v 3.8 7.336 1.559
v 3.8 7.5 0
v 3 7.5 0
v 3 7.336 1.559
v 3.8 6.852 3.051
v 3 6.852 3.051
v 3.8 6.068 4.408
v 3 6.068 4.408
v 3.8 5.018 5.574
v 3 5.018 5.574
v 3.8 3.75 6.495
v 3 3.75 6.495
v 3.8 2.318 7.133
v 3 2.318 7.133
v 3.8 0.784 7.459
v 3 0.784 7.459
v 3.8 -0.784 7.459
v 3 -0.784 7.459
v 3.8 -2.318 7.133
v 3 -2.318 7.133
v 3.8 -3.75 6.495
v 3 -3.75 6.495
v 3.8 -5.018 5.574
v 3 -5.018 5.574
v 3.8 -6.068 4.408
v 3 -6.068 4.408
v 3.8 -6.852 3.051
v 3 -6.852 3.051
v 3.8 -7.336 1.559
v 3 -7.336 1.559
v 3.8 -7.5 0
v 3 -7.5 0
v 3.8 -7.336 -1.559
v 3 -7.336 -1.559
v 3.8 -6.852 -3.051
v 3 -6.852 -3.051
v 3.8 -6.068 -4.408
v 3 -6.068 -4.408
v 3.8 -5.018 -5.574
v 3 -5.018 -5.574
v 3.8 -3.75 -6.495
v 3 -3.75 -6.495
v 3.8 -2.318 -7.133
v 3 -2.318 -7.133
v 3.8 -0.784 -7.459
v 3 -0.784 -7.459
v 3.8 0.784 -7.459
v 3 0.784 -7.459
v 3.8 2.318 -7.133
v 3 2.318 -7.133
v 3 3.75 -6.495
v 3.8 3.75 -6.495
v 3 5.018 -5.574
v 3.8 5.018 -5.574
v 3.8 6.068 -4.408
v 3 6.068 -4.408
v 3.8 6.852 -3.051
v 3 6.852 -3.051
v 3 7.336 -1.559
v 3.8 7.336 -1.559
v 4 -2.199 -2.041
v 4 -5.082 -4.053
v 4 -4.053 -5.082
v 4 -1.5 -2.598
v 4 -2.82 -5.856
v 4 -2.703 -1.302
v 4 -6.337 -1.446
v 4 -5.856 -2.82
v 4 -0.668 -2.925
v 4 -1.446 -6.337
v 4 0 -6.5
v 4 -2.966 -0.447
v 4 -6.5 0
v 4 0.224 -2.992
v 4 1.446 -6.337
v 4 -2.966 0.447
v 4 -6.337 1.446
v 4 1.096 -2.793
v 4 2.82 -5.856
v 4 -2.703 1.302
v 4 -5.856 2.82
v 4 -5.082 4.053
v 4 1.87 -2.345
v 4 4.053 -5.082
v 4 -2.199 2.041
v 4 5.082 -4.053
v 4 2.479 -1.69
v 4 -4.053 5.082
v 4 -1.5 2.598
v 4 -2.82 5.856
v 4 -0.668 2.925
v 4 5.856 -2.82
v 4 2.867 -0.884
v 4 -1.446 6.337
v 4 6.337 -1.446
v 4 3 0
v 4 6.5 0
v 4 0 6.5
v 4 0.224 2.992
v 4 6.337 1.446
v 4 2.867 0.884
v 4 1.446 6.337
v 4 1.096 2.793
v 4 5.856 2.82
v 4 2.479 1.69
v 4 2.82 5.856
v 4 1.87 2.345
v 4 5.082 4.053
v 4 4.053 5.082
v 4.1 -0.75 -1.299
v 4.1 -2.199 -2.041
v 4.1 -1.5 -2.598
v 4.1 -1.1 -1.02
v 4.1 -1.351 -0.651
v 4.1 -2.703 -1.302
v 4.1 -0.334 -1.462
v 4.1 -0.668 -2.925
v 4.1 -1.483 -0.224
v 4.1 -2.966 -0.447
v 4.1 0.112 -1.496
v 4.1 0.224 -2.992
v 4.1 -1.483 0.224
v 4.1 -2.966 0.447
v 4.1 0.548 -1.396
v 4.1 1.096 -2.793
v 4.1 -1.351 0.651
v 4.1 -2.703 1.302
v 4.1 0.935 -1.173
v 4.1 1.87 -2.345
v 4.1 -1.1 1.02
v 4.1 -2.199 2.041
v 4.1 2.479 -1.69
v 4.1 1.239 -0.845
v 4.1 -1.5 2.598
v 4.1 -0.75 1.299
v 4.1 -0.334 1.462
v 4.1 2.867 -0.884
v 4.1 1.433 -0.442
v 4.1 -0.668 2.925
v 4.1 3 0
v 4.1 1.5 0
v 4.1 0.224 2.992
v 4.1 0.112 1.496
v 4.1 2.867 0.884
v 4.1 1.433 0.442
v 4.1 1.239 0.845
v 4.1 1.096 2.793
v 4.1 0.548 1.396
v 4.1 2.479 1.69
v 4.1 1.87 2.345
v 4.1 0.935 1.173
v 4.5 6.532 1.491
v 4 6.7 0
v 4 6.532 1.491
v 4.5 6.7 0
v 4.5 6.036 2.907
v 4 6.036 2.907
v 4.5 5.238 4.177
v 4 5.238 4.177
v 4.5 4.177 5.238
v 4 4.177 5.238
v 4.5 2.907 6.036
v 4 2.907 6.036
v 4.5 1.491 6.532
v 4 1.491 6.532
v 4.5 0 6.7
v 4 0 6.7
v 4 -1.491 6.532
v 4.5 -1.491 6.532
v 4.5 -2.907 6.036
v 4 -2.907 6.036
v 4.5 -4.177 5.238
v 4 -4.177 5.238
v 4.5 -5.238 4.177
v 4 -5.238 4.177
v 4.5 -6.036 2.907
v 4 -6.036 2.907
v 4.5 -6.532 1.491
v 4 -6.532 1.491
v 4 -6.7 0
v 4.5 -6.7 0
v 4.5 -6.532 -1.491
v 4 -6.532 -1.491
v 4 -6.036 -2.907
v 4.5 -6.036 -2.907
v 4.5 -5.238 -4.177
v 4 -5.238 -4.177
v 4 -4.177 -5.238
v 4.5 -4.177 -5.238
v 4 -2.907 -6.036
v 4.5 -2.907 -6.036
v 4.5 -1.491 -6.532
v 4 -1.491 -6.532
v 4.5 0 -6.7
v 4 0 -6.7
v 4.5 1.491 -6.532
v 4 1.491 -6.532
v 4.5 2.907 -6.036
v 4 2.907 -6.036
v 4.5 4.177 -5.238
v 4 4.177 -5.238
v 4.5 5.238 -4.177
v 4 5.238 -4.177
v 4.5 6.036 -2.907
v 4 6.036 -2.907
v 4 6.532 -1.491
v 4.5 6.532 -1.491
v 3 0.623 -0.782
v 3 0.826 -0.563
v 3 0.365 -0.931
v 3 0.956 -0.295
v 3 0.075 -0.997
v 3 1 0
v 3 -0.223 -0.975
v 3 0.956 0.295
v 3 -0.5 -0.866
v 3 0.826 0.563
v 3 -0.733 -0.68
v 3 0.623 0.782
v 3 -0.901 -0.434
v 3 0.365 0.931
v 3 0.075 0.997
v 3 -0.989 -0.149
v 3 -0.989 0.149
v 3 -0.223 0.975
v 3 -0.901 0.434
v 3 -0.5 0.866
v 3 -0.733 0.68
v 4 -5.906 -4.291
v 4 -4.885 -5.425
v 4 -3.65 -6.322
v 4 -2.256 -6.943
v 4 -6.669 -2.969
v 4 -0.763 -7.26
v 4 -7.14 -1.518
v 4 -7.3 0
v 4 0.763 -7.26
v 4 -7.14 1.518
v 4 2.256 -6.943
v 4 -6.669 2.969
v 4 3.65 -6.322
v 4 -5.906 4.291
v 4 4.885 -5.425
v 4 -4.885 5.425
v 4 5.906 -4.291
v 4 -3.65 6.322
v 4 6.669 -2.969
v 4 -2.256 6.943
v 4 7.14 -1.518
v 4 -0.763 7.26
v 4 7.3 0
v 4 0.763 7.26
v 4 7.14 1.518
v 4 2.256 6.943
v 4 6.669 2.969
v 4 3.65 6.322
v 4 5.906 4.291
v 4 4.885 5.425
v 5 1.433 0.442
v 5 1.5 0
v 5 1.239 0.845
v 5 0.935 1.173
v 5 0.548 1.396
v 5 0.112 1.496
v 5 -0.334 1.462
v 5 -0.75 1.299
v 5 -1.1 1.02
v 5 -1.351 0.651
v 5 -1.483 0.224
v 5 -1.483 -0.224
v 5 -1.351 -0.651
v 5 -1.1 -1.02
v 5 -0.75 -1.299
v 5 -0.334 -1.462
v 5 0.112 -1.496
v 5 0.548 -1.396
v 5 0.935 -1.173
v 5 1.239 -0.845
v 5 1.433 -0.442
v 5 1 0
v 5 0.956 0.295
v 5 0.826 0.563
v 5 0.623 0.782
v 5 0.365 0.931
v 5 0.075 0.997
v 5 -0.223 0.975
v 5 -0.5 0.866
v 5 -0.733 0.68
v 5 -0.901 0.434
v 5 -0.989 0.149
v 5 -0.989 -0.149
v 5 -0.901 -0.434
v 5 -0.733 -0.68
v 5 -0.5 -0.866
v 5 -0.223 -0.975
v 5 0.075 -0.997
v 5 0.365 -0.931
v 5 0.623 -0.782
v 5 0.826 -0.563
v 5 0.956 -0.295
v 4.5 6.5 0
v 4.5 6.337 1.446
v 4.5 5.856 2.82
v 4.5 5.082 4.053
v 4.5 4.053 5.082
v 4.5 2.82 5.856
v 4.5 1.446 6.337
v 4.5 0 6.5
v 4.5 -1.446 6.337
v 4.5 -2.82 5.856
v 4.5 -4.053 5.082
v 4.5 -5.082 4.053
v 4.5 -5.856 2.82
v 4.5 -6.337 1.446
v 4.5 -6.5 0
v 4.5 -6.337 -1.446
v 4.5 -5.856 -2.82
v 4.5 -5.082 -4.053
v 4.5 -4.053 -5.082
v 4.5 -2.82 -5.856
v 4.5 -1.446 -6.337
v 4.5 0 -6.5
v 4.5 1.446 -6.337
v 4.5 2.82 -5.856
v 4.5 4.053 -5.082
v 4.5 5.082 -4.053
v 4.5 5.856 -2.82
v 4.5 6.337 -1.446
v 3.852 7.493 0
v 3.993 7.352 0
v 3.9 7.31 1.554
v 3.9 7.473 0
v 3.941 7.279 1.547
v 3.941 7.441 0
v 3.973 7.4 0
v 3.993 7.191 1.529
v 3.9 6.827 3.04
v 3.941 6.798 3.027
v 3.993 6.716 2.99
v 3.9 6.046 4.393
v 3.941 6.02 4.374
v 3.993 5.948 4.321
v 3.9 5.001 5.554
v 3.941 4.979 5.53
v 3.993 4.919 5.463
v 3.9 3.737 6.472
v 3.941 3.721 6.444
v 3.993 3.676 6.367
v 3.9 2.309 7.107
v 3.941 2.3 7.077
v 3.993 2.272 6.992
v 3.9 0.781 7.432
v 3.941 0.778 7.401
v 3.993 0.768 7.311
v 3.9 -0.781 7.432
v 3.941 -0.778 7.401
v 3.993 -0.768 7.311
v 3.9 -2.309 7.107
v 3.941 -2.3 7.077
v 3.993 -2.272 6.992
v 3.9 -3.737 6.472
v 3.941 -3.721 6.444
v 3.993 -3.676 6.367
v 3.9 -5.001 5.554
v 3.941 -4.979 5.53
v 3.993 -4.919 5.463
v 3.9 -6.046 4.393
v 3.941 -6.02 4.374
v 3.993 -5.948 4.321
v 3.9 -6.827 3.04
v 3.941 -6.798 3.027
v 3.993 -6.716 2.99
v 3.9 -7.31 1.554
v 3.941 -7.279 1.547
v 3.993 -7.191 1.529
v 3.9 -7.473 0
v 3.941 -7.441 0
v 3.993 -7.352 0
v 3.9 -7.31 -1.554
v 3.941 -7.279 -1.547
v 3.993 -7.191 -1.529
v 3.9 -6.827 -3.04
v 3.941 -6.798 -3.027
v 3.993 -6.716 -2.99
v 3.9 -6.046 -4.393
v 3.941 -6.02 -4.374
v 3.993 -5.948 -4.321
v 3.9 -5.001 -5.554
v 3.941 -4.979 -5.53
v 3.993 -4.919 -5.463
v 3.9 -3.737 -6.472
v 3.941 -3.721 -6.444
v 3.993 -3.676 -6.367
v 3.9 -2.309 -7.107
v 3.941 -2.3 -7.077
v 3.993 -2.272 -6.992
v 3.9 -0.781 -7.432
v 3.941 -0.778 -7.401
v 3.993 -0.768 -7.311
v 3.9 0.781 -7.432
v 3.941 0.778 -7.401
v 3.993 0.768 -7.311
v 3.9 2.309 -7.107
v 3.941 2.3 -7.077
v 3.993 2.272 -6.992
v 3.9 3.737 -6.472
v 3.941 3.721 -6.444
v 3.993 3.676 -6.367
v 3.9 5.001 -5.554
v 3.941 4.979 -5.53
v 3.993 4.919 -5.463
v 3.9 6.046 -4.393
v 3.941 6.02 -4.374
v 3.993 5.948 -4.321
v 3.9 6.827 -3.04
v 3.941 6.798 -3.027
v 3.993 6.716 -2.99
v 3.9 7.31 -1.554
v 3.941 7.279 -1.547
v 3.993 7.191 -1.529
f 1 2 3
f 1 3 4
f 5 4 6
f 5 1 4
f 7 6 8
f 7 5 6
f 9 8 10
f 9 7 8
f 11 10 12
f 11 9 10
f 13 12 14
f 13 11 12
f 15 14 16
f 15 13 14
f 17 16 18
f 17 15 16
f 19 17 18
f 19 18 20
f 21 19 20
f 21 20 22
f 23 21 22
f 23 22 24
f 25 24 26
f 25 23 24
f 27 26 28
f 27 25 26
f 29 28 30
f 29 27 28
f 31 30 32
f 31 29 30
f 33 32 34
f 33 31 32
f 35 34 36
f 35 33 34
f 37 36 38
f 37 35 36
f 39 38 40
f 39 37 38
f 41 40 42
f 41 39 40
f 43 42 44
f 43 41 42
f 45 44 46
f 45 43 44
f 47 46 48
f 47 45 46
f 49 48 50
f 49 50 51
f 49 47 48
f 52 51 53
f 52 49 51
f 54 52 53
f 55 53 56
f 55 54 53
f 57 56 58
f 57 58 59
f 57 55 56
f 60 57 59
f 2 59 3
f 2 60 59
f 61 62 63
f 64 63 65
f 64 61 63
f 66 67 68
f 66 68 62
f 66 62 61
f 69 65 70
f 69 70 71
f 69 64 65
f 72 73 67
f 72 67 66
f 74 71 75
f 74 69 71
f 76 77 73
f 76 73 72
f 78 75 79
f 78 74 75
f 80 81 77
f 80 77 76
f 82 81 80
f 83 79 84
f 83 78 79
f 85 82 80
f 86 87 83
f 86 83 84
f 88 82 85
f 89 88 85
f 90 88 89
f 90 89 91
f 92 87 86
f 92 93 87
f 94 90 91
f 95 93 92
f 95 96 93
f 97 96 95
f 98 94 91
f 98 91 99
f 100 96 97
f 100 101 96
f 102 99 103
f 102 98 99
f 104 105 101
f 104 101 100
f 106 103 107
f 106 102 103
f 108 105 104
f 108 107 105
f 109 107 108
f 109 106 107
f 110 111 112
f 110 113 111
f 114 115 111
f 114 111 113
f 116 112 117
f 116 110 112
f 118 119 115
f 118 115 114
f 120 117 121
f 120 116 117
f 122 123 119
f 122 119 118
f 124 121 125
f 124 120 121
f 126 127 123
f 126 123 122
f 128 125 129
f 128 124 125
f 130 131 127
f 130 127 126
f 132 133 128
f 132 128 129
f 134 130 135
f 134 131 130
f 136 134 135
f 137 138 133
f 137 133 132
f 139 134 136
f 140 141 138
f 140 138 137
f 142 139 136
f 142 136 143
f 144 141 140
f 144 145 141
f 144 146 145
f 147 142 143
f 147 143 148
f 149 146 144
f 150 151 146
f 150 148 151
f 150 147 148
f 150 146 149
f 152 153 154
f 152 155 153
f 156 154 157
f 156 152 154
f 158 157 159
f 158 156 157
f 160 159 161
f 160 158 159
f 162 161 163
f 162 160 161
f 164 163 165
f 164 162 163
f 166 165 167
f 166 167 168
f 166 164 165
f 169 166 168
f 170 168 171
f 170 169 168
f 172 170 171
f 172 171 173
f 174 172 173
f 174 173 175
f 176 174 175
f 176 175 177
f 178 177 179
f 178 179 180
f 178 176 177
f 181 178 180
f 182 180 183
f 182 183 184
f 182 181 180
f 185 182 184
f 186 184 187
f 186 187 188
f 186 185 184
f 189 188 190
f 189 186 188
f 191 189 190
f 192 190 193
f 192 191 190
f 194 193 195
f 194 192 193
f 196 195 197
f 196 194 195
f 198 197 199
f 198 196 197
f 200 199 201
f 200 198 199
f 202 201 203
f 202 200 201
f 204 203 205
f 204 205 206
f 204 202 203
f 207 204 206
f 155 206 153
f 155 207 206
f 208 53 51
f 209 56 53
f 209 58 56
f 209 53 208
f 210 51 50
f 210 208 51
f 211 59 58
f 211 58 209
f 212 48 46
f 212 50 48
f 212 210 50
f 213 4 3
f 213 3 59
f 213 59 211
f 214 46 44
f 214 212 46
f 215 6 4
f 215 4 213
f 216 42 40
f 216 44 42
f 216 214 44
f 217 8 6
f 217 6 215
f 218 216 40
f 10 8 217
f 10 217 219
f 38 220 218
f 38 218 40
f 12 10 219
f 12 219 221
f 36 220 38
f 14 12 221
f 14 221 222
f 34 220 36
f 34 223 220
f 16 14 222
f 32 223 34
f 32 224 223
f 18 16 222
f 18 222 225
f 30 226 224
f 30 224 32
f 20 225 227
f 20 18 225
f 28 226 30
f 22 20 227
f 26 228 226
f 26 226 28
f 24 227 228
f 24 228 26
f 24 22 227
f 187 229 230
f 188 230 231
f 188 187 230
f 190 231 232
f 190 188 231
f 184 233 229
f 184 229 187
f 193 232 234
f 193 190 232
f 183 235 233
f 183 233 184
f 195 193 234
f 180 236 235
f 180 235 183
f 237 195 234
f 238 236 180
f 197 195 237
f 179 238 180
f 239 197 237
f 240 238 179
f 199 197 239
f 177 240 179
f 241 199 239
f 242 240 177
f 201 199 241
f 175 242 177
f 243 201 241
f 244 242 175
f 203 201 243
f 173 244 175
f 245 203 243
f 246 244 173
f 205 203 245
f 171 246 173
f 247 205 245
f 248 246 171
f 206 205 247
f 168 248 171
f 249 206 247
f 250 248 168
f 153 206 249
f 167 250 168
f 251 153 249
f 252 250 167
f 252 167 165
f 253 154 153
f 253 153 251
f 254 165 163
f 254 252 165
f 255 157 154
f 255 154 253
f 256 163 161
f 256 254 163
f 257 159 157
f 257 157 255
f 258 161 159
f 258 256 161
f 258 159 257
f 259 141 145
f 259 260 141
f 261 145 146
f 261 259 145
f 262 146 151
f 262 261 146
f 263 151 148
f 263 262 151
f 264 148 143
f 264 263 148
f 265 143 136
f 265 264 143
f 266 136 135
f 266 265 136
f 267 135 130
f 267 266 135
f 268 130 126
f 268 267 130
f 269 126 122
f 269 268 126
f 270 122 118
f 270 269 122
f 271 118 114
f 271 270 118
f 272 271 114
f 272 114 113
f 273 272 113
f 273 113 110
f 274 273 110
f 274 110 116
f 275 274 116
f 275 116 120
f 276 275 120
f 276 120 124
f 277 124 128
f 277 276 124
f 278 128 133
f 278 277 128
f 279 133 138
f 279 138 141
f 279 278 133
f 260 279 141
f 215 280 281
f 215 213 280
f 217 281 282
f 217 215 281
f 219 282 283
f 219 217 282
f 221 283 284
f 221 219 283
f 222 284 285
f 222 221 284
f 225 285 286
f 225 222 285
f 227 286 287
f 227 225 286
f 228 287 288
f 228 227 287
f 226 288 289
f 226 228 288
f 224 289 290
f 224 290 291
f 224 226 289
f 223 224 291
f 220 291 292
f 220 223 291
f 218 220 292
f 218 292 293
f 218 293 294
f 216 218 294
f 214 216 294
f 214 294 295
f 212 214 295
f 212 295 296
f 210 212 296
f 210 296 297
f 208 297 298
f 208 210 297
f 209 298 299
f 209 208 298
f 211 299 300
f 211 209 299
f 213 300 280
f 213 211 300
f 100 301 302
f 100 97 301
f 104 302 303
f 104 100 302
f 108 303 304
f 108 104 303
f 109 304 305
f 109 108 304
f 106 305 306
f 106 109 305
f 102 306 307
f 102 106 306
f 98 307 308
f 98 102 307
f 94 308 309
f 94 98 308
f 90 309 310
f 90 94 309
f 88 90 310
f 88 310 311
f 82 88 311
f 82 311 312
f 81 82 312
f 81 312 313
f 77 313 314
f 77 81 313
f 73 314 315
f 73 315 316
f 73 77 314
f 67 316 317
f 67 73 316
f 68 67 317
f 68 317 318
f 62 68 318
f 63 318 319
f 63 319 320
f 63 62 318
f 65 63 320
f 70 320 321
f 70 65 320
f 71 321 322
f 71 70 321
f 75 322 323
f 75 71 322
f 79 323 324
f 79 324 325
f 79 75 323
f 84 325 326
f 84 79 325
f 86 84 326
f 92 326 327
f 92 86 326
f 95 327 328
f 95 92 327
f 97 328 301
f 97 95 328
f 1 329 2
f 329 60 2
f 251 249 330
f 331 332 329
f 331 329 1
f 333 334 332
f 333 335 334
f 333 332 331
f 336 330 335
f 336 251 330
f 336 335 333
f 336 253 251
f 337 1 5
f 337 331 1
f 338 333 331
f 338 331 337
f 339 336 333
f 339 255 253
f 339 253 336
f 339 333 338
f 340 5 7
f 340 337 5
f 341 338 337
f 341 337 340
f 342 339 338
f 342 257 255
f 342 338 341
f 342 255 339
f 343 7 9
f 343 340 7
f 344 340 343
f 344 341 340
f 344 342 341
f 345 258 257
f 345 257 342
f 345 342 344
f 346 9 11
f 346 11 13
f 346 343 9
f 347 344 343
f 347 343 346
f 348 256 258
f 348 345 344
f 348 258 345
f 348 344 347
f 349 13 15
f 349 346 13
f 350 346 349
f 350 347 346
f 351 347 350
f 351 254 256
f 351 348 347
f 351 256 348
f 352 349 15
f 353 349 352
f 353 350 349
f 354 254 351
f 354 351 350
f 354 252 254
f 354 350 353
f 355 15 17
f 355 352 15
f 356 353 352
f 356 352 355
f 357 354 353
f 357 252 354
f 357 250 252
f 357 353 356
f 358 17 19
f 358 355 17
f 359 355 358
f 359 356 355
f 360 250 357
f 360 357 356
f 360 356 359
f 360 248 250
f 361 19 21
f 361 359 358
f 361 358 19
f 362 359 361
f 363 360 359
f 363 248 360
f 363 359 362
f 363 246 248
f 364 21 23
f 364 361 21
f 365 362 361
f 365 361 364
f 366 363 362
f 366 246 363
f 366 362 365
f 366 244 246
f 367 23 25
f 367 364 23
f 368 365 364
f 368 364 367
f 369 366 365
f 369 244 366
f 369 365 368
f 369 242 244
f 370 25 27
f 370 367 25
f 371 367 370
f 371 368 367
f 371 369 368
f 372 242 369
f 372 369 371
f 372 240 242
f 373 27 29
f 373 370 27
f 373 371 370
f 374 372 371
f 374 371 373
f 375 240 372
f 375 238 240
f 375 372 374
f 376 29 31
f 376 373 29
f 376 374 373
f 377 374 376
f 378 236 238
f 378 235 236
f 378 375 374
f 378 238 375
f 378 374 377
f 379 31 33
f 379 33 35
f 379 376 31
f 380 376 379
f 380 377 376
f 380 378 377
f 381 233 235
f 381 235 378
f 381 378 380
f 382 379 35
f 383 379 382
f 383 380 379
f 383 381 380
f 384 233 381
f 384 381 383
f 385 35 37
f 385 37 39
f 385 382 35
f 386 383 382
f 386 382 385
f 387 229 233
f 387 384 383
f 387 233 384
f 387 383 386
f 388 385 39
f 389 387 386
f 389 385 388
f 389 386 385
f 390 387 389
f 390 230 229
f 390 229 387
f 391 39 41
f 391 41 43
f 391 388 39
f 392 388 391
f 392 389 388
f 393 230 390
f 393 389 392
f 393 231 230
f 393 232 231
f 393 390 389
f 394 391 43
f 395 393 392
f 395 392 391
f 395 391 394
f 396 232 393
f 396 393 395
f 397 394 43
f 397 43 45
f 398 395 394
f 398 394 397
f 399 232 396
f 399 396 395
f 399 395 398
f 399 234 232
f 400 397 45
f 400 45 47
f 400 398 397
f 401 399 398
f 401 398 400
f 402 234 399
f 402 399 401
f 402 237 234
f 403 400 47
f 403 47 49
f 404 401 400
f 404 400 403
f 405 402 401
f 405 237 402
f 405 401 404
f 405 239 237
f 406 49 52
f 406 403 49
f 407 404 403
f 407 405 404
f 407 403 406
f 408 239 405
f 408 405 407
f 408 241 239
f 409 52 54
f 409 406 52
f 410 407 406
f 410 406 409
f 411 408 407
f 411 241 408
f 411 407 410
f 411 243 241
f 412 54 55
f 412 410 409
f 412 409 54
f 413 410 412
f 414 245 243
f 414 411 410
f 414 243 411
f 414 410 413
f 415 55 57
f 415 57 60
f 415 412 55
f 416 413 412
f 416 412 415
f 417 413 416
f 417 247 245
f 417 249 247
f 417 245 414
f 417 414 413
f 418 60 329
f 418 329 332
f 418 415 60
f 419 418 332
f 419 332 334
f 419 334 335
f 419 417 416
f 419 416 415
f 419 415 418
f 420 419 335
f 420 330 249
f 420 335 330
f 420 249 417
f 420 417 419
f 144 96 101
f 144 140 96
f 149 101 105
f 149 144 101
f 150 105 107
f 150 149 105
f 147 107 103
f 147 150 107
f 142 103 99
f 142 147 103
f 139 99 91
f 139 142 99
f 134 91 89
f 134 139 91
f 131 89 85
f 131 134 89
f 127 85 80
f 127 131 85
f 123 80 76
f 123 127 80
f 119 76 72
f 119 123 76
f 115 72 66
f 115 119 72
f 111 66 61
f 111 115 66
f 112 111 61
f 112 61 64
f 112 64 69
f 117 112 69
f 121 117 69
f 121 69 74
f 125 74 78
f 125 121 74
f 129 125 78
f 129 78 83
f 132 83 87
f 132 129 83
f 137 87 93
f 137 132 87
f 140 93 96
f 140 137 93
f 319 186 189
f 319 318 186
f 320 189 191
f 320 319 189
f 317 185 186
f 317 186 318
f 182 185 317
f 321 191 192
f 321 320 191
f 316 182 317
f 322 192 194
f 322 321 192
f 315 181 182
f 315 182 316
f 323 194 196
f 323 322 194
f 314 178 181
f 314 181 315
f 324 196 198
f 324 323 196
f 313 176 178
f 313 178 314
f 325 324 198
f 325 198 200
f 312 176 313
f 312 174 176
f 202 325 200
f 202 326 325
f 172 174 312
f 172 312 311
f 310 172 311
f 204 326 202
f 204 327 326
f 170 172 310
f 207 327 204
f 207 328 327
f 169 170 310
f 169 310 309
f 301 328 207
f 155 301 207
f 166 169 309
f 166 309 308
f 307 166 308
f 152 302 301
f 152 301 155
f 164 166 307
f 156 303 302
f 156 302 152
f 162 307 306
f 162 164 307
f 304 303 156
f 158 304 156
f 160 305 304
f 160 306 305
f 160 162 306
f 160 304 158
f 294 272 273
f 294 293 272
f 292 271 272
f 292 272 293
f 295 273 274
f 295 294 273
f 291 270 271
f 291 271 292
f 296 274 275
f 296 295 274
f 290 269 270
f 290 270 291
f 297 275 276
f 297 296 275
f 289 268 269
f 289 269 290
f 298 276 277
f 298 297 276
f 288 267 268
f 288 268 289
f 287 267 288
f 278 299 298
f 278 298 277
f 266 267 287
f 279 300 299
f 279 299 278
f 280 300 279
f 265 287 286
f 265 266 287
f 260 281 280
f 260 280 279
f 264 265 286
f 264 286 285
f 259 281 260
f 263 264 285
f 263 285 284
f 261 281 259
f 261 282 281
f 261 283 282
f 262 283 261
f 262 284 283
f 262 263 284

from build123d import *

# Parameters (mm, degrees)
FILLET1_R = 0.2


with BuildPart() as part:
    # Sketch1 → Revolve1 (revolve)
    with BuildSketch(Plane.XY):
        Polygon((3, 1), (3, 7.5), (4, 7.5), (4, 6.7), (4.5, 6.7), (4.5, 6.5), (4, 6.5), (4, 3), (4.1, 3), (4.1, 1.5), (5, 1.5), (5, 1), align=None)
    revolve(axis=Axis((0, 0, 0), (1, 0, 0)))

    # Fillet1
    fillet1_edges = [part.edges().sort_by_distance(p)[0] for p in [
        (4, -7.5, 0),
    ]]
    fillet(fillet1_edges, radius=FILLET1_R)


solid = part.part
